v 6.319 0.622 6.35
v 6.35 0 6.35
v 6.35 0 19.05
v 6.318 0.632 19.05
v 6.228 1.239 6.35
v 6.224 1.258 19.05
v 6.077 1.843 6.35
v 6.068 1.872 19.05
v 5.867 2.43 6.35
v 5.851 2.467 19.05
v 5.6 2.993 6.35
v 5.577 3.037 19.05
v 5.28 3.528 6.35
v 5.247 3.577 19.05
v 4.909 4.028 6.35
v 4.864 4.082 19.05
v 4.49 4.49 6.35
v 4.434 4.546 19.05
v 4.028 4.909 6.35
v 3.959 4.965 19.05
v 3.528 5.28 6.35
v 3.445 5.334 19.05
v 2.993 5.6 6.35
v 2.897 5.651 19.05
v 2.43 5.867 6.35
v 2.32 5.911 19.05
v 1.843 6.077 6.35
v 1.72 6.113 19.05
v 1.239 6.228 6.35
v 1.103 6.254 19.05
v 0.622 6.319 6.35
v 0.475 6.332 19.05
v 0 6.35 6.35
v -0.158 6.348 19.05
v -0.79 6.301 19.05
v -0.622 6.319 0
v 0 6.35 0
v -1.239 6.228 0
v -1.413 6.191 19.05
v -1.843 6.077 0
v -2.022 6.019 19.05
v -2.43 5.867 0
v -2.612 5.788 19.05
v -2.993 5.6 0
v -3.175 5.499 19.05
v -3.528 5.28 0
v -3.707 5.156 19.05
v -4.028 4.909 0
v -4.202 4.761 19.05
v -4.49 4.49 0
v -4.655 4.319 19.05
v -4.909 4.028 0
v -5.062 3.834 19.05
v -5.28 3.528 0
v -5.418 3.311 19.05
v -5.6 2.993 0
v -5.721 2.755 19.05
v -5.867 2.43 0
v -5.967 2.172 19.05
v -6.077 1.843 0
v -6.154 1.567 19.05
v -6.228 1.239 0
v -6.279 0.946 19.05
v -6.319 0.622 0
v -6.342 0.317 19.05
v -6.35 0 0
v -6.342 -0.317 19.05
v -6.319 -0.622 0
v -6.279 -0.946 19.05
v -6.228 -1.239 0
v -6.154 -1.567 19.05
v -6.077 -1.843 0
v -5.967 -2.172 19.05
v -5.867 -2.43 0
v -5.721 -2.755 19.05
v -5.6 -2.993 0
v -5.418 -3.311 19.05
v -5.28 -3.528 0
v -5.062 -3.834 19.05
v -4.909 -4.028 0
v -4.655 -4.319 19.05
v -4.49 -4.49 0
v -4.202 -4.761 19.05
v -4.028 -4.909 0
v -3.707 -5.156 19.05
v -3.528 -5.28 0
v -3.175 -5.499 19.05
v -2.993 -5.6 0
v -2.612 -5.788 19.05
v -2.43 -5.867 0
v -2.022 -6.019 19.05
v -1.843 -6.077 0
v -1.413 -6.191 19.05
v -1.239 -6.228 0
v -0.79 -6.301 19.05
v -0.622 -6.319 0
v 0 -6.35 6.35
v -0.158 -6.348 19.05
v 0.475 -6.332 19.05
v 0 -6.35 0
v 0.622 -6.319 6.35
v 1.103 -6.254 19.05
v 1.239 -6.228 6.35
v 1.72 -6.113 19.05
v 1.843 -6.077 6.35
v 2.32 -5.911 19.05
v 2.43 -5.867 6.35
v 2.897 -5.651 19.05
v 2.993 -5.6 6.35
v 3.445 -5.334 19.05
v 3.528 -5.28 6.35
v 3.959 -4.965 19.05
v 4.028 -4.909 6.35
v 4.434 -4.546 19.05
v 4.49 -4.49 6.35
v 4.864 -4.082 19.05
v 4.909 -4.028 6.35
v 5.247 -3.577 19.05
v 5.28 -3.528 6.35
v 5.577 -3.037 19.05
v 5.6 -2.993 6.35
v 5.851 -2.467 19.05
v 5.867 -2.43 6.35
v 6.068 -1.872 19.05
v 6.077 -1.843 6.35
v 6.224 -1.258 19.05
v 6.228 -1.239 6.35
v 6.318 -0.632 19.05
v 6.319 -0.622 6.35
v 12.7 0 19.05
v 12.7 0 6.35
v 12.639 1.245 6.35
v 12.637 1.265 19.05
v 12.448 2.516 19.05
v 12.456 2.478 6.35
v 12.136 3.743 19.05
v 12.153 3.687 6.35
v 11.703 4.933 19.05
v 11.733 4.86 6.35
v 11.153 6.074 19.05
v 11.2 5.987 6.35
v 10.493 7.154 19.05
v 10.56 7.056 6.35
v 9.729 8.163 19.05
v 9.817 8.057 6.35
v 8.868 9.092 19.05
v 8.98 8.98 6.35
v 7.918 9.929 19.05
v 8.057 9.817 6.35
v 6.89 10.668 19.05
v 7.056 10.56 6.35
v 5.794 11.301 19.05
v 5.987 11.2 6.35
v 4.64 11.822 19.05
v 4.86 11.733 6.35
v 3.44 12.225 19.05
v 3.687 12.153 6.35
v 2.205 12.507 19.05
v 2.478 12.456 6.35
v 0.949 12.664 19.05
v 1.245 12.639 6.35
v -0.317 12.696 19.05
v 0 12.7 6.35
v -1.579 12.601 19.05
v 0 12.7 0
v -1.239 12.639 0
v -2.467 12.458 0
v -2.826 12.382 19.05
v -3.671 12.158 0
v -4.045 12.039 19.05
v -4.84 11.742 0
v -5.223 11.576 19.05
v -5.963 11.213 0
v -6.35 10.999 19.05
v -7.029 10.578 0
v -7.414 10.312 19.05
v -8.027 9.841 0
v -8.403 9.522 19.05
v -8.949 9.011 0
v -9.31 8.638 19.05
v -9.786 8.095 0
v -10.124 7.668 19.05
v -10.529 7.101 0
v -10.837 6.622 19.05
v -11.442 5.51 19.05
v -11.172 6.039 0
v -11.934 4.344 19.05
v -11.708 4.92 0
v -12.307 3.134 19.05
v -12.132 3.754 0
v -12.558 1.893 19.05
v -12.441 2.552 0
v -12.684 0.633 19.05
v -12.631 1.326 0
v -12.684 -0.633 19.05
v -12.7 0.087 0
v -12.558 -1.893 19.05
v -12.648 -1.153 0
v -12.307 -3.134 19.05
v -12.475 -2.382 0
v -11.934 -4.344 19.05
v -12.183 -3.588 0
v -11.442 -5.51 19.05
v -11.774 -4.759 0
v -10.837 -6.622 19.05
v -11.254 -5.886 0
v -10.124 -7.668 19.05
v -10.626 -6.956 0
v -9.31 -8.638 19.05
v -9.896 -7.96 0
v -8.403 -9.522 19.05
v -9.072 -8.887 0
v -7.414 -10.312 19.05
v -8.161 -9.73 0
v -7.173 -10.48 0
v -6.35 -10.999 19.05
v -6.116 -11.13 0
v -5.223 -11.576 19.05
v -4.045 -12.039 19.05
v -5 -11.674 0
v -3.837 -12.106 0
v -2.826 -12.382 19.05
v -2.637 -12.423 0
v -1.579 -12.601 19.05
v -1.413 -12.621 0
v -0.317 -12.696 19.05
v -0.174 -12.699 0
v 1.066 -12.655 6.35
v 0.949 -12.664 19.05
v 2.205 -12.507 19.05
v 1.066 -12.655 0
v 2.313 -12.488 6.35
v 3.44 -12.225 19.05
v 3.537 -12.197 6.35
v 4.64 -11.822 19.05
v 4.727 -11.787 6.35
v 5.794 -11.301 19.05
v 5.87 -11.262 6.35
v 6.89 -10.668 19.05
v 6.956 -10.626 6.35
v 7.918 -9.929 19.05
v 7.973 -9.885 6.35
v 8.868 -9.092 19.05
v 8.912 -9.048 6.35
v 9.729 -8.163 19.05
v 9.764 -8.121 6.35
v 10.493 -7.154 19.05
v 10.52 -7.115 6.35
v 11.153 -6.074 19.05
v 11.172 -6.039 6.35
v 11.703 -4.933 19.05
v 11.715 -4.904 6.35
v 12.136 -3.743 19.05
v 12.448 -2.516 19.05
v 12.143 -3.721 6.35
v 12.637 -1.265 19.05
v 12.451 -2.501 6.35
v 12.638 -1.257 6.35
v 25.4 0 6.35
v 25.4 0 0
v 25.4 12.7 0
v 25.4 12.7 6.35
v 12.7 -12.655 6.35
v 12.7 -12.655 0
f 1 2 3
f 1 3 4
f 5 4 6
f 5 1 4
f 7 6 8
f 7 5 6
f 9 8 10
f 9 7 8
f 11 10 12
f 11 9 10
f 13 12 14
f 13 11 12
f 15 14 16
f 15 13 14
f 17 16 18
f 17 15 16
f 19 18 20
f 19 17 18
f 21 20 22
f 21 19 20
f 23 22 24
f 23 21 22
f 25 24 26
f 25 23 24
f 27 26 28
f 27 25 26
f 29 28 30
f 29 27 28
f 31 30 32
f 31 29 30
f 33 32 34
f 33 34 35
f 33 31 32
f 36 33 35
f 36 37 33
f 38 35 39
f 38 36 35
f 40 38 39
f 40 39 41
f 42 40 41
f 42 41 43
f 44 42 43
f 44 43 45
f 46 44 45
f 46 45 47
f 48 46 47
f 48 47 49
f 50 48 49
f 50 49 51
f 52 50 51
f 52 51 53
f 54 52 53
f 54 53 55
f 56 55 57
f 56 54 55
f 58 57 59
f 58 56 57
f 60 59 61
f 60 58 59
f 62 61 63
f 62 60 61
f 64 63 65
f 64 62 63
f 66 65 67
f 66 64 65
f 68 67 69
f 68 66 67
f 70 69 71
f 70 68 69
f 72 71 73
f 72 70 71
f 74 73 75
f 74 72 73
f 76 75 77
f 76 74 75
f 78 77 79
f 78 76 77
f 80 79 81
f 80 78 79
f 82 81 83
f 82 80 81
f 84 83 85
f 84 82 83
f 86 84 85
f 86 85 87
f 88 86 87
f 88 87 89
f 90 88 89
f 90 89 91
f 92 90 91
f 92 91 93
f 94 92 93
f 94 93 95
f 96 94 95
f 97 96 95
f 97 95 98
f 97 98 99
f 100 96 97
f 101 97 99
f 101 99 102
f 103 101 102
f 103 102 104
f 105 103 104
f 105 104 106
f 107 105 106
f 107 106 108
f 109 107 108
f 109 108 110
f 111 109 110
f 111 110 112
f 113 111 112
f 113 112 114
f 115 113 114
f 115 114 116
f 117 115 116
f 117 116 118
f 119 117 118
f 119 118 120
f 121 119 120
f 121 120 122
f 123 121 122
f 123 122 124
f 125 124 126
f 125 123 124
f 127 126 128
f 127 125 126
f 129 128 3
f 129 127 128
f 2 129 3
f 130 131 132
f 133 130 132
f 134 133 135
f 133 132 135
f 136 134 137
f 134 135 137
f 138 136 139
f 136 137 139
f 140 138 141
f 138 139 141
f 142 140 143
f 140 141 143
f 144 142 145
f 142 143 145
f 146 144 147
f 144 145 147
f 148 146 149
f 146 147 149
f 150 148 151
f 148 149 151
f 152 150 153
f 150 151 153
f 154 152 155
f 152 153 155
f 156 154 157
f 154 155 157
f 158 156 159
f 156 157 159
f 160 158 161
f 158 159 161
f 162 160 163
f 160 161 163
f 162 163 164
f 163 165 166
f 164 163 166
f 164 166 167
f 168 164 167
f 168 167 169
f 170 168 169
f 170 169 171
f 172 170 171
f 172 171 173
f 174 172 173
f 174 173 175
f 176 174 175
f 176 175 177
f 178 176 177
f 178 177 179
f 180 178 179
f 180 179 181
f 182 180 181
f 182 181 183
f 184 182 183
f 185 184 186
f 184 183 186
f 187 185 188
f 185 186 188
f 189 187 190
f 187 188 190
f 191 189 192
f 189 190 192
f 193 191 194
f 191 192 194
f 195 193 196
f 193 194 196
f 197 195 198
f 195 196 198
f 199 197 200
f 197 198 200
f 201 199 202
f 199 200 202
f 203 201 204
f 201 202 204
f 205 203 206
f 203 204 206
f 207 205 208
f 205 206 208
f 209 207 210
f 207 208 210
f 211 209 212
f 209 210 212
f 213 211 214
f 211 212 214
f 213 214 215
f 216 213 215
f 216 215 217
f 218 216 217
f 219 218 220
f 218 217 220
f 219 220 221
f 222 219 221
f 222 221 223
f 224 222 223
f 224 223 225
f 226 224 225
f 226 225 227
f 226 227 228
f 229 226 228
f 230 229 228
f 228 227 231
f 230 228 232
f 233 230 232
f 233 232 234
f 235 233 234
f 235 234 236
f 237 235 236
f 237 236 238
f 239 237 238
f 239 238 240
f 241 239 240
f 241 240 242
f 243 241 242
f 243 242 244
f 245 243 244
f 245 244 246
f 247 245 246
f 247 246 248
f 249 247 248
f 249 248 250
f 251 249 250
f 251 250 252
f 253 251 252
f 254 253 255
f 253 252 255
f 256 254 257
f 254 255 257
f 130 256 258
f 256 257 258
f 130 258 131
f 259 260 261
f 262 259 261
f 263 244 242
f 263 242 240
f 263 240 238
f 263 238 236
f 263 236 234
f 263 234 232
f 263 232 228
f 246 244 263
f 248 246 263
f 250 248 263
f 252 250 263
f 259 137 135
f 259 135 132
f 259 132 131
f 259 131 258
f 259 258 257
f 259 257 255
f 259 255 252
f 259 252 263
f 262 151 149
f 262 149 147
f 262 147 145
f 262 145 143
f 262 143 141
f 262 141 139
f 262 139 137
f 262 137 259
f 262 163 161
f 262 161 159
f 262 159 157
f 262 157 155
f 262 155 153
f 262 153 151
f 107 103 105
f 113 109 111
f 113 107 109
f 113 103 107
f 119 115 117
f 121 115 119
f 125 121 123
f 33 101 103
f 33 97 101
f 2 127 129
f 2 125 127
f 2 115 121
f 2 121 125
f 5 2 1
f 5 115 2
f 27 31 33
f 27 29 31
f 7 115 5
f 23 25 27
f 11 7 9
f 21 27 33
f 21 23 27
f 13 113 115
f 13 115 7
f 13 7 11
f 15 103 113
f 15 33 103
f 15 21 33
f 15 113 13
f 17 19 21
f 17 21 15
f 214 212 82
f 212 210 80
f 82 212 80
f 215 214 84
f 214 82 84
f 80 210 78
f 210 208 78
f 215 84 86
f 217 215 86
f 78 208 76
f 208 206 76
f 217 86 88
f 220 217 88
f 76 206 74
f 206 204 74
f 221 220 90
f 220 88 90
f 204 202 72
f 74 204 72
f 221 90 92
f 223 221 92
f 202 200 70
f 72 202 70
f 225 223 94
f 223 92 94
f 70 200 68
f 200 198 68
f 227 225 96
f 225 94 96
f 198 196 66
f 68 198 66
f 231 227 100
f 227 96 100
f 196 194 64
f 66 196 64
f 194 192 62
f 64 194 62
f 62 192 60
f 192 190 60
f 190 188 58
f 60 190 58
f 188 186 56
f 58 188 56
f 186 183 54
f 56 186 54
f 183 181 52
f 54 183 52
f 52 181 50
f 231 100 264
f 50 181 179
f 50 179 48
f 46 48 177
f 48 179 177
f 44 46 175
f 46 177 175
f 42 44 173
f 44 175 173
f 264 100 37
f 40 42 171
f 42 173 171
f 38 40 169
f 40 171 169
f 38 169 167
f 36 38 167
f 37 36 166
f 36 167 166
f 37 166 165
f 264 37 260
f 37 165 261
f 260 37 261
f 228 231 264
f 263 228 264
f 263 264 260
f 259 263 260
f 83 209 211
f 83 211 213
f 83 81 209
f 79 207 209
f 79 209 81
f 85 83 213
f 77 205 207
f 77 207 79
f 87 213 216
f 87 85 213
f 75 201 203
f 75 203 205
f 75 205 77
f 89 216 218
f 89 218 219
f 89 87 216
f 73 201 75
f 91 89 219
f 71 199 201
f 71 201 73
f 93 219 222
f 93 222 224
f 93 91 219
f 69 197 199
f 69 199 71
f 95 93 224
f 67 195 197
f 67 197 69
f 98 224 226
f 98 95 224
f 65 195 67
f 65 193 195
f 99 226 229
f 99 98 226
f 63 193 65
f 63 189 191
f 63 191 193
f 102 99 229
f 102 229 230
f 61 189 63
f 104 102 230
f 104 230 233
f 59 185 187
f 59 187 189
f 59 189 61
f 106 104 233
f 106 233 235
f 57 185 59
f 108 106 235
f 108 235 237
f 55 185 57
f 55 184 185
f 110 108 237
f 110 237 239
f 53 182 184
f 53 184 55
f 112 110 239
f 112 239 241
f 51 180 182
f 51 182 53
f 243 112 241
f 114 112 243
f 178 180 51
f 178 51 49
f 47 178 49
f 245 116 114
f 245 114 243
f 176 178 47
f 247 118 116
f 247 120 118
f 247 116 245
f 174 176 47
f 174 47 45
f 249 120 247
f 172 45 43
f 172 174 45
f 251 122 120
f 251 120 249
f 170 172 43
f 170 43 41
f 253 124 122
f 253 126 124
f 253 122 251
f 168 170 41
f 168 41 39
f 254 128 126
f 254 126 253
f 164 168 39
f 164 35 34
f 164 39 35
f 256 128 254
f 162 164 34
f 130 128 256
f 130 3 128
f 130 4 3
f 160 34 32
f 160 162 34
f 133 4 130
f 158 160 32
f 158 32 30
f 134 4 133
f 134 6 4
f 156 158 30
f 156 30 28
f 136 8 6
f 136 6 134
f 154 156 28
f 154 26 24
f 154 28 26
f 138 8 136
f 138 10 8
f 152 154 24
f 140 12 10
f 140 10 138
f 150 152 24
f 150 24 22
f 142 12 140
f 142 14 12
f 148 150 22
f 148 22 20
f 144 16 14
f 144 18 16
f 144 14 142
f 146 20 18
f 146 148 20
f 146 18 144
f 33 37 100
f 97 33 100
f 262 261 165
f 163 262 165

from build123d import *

# Parameters (mm, degrees)
F0_R     = 12.7
F0_R_2   = 6.35
F1_DEPTH = 19.05
F3_DEPTH = 6.35


with BuildPart() as f1:
    # F0 (on Top) → F1 (new body)
    with BuildSketch(Plane.XY):
        Circle(F0_R)
        Circle(F0_R_2, mode=Mode.SUBTRACT)
    extrude(amount=F1_DEPTH)

    # F2 (on Top) → F3 (join)
    with BuildSketch(Plane.XY):
        Polygon((25.4, 12.7), (0, 12.7), (0, -12.655177), (12.7, -12.655177), (25.4, 0), align=None)
    extrude(amount=F3_DEPTH)


solid = f1.part
